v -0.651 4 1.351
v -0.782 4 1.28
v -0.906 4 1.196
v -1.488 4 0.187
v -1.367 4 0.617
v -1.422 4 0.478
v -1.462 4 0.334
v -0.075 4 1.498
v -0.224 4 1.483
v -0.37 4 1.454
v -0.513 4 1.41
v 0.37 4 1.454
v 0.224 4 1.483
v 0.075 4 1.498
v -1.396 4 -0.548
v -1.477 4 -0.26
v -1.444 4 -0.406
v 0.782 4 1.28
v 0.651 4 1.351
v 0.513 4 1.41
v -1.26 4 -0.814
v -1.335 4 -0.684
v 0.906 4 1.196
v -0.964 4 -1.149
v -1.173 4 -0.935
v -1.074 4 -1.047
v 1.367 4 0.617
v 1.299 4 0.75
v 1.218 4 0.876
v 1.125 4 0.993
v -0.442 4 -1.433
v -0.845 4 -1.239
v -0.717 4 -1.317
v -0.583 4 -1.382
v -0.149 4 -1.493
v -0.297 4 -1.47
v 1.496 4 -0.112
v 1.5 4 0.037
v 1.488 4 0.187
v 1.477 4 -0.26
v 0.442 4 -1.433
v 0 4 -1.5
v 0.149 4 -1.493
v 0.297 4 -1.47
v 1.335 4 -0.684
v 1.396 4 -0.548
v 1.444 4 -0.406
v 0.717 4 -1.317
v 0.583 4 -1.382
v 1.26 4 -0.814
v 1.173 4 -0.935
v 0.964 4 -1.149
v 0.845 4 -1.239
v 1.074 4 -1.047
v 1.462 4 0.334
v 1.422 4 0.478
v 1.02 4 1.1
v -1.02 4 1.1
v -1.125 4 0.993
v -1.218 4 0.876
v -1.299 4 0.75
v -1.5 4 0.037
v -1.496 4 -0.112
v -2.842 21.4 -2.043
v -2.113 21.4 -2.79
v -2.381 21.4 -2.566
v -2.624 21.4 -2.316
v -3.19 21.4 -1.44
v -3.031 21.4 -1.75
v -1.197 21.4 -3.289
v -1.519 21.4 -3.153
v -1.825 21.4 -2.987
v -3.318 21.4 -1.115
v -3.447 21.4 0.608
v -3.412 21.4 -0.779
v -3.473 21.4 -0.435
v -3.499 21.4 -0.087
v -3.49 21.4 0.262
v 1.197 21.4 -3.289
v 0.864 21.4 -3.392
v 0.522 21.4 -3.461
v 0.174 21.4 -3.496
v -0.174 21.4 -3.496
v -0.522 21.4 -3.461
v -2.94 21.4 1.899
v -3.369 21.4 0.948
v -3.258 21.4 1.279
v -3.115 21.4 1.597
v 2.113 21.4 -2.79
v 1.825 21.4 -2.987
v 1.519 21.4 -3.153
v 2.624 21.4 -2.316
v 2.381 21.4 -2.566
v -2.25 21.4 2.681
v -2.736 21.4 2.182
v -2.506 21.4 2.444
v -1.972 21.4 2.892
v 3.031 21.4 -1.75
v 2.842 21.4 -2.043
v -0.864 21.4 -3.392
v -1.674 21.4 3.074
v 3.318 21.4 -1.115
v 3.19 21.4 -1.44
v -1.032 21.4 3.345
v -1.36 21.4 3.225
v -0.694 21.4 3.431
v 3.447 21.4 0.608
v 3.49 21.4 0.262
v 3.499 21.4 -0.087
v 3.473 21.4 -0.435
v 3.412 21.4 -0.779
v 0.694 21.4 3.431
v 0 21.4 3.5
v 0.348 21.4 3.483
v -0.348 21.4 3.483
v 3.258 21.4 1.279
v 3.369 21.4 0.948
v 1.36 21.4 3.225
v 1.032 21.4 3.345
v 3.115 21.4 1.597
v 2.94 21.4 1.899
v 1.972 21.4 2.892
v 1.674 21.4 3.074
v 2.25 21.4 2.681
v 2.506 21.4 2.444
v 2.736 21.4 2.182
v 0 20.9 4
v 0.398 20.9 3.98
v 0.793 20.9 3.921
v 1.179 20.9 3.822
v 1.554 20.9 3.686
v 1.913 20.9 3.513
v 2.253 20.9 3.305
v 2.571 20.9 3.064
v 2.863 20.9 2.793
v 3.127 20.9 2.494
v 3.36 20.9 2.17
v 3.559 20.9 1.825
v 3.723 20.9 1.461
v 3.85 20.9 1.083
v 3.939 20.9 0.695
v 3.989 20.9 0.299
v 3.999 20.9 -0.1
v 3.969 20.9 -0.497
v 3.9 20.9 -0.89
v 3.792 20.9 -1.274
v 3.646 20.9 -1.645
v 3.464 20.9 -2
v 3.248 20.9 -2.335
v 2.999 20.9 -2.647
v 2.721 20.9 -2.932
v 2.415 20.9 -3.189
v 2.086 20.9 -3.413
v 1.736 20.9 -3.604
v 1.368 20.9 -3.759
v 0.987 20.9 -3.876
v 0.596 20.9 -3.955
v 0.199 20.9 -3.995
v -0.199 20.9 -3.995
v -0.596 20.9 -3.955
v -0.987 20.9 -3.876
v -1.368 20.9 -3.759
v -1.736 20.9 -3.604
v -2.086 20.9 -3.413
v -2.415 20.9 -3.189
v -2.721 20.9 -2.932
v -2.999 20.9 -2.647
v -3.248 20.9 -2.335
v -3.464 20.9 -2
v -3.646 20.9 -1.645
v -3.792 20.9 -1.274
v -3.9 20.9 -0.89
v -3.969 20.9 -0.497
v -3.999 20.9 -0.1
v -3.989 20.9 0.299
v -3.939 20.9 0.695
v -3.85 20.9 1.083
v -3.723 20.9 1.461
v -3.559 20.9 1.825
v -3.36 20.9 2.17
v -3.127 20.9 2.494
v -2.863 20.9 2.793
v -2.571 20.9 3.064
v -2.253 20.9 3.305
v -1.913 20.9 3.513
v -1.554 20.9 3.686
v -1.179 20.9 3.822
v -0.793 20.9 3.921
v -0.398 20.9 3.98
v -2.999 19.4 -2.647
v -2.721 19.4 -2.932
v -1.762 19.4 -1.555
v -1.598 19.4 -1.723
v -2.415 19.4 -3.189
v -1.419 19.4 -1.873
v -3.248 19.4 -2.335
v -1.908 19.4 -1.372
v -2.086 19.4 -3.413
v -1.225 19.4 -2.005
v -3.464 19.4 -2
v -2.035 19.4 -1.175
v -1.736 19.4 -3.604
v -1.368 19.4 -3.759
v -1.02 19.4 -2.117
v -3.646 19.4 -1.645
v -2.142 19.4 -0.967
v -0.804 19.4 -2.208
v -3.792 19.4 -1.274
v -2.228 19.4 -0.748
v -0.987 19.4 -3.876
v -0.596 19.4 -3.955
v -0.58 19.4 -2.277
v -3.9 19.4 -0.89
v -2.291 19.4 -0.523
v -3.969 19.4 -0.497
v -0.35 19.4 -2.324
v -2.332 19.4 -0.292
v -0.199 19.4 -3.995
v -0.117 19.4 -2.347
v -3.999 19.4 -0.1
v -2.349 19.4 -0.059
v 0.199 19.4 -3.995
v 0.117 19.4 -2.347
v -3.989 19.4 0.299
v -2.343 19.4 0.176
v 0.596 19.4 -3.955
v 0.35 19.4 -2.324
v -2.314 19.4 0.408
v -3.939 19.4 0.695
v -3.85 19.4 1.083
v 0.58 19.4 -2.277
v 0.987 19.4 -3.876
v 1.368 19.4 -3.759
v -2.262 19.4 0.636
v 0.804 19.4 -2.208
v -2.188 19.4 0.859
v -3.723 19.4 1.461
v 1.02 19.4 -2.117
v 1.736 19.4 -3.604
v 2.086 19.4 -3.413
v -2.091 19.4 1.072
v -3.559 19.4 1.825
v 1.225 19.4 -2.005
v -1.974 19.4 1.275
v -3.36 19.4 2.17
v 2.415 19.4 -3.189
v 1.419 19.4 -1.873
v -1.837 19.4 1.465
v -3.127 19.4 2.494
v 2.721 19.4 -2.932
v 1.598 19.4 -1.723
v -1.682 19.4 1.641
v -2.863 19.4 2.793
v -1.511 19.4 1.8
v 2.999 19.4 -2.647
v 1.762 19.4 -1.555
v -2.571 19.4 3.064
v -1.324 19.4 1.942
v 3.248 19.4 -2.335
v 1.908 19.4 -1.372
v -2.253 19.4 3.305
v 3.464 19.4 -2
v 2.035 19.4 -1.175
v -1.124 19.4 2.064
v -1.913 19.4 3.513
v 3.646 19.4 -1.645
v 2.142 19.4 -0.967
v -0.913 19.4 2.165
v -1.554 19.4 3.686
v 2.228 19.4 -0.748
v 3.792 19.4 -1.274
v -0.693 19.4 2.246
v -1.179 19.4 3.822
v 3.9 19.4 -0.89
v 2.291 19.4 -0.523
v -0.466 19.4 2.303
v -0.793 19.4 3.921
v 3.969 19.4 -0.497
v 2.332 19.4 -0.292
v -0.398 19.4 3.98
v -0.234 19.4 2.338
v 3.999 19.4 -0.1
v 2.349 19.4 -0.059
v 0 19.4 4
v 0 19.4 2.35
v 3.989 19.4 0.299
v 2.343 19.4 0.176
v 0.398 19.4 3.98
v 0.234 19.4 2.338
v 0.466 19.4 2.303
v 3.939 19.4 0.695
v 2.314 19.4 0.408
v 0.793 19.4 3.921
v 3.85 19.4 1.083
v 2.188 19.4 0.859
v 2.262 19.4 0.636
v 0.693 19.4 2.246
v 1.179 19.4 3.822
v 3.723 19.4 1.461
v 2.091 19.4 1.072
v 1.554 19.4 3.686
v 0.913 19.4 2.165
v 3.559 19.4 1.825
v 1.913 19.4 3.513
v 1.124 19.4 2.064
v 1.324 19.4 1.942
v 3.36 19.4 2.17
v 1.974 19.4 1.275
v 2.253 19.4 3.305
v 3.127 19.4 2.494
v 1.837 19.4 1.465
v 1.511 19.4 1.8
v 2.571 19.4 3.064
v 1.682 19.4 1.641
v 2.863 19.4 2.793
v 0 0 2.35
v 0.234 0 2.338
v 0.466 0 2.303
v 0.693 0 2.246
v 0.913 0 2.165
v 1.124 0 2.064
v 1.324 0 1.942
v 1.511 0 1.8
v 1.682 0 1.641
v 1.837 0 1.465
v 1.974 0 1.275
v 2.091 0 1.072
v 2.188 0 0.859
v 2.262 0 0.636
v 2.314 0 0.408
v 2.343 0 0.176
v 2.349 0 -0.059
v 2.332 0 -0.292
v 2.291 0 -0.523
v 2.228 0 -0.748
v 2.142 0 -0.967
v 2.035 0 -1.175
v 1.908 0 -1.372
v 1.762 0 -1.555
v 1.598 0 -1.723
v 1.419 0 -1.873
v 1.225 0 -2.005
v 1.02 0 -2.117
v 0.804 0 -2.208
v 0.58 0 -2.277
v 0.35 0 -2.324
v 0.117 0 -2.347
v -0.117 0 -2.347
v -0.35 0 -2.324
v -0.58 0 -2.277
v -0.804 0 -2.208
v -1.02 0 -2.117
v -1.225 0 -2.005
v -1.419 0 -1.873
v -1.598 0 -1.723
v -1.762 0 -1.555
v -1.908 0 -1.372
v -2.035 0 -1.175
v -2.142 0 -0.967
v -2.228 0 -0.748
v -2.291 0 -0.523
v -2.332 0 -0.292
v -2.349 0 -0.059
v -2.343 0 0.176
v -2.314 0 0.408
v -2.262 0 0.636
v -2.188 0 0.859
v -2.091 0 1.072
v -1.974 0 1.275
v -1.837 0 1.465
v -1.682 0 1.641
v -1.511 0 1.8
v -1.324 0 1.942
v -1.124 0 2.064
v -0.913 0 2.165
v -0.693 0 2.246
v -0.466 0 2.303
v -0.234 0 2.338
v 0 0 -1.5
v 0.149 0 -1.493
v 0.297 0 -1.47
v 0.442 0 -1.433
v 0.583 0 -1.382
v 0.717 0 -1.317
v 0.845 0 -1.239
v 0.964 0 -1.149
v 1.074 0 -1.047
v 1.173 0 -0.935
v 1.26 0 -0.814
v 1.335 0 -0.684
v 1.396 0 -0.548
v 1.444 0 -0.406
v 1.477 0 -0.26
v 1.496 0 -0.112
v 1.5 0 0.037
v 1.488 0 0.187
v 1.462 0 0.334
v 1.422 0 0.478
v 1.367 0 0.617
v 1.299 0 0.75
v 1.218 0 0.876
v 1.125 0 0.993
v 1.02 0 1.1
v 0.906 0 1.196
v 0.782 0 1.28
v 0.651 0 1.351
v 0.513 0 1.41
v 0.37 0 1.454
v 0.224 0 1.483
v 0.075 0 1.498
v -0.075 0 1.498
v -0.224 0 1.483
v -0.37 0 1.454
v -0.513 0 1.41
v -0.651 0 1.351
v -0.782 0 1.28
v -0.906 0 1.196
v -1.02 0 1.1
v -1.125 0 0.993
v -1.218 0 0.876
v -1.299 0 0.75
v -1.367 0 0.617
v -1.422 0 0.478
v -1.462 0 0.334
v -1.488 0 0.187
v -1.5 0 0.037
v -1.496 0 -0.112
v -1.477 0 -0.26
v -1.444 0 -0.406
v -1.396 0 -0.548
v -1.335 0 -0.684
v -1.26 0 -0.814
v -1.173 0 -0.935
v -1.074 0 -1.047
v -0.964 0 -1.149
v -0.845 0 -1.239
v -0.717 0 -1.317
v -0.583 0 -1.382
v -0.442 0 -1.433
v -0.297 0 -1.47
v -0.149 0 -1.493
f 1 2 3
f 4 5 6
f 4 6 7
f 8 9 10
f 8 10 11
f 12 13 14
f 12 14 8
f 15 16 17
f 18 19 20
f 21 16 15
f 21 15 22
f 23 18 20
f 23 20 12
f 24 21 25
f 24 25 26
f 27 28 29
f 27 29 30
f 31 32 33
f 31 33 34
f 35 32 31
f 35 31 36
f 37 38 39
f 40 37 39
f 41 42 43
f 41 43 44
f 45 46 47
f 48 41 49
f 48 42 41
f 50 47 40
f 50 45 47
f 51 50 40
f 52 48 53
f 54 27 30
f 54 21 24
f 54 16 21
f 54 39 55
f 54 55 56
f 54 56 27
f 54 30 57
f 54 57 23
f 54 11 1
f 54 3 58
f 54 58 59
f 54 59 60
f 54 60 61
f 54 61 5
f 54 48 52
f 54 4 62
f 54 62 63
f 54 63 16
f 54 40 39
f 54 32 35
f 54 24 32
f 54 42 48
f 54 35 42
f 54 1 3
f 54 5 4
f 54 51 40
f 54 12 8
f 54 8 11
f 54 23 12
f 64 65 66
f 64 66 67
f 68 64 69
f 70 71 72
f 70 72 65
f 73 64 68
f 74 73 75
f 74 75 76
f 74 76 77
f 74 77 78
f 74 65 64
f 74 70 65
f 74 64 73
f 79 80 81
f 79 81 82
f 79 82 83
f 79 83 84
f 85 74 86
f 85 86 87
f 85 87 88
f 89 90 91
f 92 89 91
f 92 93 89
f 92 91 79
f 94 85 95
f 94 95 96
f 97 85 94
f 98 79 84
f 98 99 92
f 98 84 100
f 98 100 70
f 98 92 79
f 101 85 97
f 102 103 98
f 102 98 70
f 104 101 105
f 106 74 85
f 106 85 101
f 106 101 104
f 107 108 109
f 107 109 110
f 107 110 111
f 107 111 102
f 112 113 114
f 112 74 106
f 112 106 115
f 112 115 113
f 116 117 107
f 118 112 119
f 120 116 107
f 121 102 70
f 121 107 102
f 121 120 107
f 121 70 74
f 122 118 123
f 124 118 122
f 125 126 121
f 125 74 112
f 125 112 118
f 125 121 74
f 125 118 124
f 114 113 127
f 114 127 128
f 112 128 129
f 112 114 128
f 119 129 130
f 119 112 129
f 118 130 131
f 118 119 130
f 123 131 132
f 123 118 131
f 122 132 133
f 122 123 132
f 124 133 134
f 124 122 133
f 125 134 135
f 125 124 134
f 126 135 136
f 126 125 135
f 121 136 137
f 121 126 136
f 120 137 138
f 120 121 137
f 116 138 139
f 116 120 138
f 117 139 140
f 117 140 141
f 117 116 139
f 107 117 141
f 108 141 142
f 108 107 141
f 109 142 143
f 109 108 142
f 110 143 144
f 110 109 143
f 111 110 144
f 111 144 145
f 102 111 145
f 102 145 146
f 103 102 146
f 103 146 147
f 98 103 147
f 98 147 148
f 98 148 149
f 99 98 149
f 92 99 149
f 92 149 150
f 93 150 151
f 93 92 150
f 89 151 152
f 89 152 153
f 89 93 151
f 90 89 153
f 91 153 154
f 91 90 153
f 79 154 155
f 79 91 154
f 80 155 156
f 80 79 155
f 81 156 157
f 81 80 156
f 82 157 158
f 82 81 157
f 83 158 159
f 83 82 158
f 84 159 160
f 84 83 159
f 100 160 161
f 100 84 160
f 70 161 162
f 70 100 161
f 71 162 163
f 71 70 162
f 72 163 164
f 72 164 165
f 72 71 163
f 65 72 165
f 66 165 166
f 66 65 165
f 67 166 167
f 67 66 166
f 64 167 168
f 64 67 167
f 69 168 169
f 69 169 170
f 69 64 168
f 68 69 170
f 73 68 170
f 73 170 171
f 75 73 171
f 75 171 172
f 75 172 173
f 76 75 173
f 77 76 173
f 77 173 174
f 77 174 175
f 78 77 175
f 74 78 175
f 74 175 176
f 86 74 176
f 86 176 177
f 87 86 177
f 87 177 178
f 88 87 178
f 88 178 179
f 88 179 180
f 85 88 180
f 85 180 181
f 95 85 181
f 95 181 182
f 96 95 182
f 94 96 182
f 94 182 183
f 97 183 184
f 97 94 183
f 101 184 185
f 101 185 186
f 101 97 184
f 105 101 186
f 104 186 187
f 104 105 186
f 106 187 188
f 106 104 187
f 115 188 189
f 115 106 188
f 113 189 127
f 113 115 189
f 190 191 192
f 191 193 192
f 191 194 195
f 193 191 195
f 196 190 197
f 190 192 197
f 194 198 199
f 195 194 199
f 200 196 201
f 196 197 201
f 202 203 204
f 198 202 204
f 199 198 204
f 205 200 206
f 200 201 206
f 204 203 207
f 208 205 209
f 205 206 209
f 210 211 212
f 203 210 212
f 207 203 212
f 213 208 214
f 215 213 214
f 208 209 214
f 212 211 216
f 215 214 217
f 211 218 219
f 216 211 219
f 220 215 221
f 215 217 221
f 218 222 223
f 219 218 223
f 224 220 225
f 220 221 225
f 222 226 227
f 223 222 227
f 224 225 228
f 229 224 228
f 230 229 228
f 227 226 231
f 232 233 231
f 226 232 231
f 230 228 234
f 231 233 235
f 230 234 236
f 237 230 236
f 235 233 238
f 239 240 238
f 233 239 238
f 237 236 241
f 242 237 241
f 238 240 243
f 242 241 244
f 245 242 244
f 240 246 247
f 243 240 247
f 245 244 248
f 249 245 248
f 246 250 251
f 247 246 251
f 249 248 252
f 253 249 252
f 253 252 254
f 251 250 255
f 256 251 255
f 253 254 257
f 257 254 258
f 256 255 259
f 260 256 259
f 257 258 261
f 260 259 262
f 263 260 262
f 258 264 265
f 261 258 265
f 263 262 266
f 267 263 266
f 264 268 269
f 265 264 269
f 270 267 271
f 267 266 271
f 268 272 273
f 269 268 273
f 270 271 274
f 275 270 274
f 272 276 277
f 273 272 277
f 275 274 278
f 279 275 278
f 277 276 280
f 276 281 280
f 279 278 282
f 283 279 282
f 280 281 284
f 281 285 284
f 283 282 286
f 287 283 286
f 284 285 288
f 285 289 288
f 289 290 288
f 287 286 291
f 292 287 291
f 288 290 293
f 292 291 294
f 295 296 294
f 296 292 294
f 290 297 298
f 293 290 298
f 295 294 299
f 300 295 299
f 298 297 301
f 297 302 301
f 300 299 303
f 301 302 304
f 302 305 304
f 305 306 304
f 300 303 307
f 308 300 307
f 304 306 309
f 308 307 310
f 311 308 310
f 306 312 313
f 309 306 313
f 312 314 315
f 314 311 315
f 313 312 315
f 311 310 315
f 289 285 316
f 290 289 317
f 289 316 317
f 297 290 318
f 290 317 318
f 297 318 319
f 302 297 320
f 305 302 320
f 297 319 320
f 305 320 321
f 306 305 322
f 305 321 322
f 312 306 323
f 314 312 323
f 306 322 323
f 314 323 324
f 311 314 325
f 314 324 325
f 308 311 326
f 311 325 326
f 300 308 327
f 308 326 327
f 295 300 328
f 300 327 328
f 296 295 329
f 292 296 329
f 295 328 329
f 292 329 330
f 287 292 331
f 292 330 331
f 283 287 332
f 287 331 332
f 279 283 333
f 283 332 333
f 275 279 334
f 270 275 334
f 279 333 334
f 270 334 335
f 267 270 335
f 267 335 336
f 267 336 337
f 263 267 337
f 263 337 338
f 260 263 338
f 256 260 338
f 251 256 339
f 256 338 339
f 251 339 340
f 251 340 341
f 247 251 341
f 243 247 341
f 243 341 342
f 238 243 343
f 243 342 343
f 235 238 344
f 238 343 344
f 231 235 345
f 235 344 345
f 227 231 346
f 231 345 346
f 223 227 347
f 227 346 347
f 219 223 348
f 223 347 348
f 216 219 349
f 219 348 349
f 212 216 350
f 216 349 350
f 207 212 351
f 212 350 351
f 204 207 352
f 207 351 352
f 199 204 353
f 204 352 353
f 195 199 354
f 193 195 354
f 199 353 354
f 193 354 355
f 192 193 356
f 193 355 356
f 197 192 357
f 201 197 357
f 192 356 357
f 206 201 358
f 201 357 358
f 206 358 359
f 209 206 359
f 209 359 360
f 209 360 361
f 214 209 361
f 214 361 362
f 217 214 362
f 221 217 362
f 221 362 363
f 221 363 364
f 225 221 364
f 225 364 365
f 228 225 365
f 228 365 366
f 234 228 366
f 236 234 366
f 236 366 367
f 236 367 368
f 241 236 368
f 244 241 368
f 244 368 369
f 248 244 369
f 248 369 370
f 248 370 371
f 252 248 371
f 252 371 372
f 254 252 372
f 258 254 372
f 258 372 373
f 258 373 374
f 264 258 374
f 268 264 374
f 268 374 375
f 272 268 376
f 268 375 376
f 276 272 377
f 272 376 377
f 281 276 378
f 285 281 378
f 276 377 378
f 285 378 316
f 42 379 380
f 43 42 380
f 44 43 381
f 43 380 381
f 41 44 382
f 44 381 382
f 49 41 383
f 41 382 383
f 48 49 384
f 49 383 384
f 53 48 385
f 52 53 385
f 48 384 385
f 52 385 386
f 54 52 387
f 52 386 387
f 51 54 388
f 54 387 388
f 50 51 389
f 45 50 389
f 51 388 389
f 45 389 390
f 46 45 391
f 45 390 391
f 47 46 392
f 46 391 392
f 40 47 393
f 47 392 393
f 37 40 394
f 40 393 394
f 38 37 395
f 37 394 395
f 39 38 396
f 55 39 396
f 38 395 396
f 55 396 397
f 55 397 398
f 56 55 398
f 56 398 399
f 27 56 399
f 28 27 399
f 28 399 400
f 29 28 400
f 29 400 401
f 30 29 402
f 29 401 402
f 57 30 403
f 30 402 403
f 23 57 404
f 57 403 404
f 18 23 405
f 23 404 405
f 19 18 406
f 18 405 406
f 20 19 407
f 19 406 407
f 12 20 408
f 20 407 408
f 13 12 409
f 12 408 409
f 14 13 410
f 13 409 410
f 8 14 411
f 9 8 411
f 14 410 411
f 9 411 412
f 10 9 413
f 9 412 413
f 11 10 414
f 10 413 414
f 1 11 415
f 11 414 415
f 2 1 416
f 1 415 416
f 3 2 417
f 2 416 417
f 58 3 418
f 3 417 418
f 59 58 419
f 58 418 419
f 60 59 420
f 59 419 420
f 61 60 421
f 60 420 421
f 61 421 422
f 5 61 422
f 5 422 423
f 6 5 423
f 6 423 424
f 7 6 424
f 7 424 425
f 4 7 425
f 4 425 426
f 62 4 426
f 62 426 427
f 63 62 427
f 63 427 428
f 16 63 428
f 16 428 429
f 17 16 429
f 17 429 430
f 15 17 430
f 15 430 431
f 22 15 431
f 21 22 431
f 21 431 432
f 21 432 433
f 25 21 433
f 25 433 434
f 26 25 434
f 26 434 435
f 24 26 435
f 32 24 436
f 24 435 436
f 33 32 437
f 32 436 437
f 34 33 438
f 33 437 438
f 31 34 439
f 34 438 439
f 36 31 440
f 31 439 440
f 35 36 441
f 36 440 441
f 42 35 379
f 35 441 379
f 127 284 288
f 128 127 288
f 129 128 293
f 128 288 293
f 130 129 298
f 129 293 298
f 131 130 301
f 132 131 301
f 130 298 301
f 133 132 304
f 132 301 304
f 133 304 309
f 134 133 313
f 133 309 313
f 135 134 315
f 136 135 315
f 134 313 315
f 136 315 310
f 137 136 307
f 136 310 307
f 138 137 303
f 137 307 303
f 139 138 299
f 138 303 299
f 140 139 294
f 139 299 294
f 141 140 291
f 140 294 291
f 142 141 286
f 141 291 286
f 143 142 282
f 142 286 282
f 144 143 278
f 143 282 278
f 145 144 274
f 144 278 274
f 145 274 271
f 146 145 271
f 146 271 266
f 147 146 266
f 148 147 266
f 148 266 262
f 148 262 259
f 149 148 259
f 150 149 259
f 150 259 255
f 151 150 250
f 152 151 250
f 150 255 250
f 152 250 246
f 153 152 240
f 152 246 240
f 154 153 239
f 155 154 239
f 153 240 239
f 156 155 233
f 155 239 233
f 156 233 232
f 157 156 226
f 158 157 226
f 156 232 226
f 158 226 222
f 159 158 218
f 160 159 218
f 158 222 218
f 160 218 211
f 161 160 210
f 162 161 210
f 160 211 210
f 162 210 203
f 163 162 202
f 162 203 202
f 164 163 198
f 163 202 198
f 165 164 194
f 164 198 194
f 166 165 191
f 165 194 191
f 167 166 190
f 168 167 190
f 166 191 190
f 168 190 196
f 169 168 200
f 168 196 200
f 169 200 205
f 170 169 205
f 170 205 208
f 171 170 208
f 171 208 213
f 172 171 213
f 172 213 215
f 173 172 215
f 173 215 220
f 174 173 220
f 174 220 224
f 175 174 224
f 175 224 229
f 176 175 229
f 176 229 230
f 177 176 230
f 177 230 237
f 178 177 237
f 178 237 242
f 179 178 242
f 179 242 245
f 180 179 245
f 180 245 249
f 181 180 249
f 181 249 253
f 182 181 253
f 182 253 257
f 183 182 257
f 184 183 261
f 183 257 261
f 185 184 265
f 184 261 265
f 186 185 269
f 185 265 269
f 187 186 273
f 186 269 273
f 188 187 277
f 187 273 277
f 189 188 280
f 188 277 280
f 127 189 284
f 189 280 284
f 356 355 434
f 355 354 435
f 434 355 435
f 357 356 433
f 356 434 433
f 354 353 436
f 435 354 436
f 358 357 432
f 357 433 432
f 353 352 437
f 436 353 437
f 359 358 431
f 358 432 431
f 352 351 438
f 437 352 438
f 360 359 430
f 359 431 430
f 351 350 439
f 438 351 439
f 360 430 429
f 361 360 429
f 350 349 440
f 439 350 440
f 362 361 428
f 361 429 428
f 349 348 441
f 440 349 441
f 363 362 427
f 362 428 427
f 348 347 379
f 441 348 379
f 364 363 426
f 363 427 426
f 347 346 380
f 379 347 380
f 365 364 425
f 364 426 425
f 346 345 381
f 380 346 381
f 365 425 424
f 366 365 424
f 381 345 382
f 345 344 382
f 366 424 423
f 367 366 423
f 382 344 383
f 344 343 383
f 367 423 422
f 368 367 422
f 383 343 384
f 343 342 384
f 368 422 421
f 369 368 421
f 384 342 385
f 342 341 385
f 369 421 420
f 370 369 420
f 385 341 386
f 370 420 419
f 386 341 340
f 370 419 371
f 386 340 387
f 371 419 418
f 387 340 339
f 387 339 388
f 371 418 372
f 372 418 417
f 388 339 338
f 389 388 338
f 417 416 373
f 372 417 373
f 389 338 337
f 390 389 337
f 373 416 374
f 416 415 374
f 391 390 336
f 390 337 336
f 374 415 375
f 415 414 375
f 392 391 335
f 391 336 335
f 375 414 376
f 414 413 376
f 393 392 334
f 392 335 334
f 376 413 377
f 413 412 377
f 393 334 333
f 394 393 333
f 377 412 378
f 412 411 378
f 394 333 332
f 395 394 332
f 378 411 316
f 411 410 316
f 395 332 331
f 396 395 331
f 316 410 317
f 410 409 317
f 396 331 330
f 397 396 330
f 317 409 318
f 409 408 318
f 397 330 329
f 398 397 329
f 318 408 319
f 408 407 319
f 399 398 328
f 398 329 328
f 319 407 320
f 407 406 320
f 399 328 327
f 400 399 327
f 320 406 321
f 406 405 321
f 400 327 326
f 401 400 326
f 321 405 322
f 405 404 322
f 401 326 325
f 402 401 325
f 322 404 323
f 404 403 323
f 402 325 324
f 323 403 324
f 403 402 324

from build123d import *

# Parameters (mm, degrees)
SKETCH1_R           = 2.35
BOSS_EXTRUDE1_DEPTH = 19.4
SKETCH2_R           = 4
BOSS_EXTRUDE2_DEPTH = 2
CHAMFER1_SIZE       = 0.5
SKETCH3_R           = 1.5
CUT_EXTRUDE1_DEPTH  = 4


with BuildPart() as part:
    # Sketch1 → Boss-Extrude1 (new body)
    with BuildSketch(Plane(origin=(0, 0, 0), x_dir=(1, 0, 0), z_dir=(0, 1, 0))):
        with Locations(Location((0, 0, 0), (0, 0, 270))):
            Circle(SKETCH1_R)
    extrude(amount=BOSS_EXTRUDE1_DEPTH)

    # Sketch2 → Boss-Extrude2 (add)
    with BuildSketch(Plane(origin=(0, 19.4, 0), x_dir=(1, 0, 0), z_dir=(0, 1, 0))):
        with Locations(Location((0, 0, 0), (0, 0, 270))):
            Circle(SKETCH2_R)
    extrude(amount=BOSS_EXTRUDE2_DEPTH)

    # Chamfer1
    chamfer1_edges = [part.edges().sort_by_distance(p)[0] for p in [
        (0, 21.4, -4),
    ]]
    chamfer(chamfer1_edges, length=CHAMFER1_SIZE)

    # Sketch3 → Cut-Extrude1 (cut)
    with BuildSketch(Plane.XZ):
        with Locations(Location((0, 0, 0), (0, 0, 270))):
            Circle(SKETCH3_R)
    extrude(amount=-CUT_EXTRUDE1_DEPTH, mode=Mode.SUBTRACT)


solid = part.part
